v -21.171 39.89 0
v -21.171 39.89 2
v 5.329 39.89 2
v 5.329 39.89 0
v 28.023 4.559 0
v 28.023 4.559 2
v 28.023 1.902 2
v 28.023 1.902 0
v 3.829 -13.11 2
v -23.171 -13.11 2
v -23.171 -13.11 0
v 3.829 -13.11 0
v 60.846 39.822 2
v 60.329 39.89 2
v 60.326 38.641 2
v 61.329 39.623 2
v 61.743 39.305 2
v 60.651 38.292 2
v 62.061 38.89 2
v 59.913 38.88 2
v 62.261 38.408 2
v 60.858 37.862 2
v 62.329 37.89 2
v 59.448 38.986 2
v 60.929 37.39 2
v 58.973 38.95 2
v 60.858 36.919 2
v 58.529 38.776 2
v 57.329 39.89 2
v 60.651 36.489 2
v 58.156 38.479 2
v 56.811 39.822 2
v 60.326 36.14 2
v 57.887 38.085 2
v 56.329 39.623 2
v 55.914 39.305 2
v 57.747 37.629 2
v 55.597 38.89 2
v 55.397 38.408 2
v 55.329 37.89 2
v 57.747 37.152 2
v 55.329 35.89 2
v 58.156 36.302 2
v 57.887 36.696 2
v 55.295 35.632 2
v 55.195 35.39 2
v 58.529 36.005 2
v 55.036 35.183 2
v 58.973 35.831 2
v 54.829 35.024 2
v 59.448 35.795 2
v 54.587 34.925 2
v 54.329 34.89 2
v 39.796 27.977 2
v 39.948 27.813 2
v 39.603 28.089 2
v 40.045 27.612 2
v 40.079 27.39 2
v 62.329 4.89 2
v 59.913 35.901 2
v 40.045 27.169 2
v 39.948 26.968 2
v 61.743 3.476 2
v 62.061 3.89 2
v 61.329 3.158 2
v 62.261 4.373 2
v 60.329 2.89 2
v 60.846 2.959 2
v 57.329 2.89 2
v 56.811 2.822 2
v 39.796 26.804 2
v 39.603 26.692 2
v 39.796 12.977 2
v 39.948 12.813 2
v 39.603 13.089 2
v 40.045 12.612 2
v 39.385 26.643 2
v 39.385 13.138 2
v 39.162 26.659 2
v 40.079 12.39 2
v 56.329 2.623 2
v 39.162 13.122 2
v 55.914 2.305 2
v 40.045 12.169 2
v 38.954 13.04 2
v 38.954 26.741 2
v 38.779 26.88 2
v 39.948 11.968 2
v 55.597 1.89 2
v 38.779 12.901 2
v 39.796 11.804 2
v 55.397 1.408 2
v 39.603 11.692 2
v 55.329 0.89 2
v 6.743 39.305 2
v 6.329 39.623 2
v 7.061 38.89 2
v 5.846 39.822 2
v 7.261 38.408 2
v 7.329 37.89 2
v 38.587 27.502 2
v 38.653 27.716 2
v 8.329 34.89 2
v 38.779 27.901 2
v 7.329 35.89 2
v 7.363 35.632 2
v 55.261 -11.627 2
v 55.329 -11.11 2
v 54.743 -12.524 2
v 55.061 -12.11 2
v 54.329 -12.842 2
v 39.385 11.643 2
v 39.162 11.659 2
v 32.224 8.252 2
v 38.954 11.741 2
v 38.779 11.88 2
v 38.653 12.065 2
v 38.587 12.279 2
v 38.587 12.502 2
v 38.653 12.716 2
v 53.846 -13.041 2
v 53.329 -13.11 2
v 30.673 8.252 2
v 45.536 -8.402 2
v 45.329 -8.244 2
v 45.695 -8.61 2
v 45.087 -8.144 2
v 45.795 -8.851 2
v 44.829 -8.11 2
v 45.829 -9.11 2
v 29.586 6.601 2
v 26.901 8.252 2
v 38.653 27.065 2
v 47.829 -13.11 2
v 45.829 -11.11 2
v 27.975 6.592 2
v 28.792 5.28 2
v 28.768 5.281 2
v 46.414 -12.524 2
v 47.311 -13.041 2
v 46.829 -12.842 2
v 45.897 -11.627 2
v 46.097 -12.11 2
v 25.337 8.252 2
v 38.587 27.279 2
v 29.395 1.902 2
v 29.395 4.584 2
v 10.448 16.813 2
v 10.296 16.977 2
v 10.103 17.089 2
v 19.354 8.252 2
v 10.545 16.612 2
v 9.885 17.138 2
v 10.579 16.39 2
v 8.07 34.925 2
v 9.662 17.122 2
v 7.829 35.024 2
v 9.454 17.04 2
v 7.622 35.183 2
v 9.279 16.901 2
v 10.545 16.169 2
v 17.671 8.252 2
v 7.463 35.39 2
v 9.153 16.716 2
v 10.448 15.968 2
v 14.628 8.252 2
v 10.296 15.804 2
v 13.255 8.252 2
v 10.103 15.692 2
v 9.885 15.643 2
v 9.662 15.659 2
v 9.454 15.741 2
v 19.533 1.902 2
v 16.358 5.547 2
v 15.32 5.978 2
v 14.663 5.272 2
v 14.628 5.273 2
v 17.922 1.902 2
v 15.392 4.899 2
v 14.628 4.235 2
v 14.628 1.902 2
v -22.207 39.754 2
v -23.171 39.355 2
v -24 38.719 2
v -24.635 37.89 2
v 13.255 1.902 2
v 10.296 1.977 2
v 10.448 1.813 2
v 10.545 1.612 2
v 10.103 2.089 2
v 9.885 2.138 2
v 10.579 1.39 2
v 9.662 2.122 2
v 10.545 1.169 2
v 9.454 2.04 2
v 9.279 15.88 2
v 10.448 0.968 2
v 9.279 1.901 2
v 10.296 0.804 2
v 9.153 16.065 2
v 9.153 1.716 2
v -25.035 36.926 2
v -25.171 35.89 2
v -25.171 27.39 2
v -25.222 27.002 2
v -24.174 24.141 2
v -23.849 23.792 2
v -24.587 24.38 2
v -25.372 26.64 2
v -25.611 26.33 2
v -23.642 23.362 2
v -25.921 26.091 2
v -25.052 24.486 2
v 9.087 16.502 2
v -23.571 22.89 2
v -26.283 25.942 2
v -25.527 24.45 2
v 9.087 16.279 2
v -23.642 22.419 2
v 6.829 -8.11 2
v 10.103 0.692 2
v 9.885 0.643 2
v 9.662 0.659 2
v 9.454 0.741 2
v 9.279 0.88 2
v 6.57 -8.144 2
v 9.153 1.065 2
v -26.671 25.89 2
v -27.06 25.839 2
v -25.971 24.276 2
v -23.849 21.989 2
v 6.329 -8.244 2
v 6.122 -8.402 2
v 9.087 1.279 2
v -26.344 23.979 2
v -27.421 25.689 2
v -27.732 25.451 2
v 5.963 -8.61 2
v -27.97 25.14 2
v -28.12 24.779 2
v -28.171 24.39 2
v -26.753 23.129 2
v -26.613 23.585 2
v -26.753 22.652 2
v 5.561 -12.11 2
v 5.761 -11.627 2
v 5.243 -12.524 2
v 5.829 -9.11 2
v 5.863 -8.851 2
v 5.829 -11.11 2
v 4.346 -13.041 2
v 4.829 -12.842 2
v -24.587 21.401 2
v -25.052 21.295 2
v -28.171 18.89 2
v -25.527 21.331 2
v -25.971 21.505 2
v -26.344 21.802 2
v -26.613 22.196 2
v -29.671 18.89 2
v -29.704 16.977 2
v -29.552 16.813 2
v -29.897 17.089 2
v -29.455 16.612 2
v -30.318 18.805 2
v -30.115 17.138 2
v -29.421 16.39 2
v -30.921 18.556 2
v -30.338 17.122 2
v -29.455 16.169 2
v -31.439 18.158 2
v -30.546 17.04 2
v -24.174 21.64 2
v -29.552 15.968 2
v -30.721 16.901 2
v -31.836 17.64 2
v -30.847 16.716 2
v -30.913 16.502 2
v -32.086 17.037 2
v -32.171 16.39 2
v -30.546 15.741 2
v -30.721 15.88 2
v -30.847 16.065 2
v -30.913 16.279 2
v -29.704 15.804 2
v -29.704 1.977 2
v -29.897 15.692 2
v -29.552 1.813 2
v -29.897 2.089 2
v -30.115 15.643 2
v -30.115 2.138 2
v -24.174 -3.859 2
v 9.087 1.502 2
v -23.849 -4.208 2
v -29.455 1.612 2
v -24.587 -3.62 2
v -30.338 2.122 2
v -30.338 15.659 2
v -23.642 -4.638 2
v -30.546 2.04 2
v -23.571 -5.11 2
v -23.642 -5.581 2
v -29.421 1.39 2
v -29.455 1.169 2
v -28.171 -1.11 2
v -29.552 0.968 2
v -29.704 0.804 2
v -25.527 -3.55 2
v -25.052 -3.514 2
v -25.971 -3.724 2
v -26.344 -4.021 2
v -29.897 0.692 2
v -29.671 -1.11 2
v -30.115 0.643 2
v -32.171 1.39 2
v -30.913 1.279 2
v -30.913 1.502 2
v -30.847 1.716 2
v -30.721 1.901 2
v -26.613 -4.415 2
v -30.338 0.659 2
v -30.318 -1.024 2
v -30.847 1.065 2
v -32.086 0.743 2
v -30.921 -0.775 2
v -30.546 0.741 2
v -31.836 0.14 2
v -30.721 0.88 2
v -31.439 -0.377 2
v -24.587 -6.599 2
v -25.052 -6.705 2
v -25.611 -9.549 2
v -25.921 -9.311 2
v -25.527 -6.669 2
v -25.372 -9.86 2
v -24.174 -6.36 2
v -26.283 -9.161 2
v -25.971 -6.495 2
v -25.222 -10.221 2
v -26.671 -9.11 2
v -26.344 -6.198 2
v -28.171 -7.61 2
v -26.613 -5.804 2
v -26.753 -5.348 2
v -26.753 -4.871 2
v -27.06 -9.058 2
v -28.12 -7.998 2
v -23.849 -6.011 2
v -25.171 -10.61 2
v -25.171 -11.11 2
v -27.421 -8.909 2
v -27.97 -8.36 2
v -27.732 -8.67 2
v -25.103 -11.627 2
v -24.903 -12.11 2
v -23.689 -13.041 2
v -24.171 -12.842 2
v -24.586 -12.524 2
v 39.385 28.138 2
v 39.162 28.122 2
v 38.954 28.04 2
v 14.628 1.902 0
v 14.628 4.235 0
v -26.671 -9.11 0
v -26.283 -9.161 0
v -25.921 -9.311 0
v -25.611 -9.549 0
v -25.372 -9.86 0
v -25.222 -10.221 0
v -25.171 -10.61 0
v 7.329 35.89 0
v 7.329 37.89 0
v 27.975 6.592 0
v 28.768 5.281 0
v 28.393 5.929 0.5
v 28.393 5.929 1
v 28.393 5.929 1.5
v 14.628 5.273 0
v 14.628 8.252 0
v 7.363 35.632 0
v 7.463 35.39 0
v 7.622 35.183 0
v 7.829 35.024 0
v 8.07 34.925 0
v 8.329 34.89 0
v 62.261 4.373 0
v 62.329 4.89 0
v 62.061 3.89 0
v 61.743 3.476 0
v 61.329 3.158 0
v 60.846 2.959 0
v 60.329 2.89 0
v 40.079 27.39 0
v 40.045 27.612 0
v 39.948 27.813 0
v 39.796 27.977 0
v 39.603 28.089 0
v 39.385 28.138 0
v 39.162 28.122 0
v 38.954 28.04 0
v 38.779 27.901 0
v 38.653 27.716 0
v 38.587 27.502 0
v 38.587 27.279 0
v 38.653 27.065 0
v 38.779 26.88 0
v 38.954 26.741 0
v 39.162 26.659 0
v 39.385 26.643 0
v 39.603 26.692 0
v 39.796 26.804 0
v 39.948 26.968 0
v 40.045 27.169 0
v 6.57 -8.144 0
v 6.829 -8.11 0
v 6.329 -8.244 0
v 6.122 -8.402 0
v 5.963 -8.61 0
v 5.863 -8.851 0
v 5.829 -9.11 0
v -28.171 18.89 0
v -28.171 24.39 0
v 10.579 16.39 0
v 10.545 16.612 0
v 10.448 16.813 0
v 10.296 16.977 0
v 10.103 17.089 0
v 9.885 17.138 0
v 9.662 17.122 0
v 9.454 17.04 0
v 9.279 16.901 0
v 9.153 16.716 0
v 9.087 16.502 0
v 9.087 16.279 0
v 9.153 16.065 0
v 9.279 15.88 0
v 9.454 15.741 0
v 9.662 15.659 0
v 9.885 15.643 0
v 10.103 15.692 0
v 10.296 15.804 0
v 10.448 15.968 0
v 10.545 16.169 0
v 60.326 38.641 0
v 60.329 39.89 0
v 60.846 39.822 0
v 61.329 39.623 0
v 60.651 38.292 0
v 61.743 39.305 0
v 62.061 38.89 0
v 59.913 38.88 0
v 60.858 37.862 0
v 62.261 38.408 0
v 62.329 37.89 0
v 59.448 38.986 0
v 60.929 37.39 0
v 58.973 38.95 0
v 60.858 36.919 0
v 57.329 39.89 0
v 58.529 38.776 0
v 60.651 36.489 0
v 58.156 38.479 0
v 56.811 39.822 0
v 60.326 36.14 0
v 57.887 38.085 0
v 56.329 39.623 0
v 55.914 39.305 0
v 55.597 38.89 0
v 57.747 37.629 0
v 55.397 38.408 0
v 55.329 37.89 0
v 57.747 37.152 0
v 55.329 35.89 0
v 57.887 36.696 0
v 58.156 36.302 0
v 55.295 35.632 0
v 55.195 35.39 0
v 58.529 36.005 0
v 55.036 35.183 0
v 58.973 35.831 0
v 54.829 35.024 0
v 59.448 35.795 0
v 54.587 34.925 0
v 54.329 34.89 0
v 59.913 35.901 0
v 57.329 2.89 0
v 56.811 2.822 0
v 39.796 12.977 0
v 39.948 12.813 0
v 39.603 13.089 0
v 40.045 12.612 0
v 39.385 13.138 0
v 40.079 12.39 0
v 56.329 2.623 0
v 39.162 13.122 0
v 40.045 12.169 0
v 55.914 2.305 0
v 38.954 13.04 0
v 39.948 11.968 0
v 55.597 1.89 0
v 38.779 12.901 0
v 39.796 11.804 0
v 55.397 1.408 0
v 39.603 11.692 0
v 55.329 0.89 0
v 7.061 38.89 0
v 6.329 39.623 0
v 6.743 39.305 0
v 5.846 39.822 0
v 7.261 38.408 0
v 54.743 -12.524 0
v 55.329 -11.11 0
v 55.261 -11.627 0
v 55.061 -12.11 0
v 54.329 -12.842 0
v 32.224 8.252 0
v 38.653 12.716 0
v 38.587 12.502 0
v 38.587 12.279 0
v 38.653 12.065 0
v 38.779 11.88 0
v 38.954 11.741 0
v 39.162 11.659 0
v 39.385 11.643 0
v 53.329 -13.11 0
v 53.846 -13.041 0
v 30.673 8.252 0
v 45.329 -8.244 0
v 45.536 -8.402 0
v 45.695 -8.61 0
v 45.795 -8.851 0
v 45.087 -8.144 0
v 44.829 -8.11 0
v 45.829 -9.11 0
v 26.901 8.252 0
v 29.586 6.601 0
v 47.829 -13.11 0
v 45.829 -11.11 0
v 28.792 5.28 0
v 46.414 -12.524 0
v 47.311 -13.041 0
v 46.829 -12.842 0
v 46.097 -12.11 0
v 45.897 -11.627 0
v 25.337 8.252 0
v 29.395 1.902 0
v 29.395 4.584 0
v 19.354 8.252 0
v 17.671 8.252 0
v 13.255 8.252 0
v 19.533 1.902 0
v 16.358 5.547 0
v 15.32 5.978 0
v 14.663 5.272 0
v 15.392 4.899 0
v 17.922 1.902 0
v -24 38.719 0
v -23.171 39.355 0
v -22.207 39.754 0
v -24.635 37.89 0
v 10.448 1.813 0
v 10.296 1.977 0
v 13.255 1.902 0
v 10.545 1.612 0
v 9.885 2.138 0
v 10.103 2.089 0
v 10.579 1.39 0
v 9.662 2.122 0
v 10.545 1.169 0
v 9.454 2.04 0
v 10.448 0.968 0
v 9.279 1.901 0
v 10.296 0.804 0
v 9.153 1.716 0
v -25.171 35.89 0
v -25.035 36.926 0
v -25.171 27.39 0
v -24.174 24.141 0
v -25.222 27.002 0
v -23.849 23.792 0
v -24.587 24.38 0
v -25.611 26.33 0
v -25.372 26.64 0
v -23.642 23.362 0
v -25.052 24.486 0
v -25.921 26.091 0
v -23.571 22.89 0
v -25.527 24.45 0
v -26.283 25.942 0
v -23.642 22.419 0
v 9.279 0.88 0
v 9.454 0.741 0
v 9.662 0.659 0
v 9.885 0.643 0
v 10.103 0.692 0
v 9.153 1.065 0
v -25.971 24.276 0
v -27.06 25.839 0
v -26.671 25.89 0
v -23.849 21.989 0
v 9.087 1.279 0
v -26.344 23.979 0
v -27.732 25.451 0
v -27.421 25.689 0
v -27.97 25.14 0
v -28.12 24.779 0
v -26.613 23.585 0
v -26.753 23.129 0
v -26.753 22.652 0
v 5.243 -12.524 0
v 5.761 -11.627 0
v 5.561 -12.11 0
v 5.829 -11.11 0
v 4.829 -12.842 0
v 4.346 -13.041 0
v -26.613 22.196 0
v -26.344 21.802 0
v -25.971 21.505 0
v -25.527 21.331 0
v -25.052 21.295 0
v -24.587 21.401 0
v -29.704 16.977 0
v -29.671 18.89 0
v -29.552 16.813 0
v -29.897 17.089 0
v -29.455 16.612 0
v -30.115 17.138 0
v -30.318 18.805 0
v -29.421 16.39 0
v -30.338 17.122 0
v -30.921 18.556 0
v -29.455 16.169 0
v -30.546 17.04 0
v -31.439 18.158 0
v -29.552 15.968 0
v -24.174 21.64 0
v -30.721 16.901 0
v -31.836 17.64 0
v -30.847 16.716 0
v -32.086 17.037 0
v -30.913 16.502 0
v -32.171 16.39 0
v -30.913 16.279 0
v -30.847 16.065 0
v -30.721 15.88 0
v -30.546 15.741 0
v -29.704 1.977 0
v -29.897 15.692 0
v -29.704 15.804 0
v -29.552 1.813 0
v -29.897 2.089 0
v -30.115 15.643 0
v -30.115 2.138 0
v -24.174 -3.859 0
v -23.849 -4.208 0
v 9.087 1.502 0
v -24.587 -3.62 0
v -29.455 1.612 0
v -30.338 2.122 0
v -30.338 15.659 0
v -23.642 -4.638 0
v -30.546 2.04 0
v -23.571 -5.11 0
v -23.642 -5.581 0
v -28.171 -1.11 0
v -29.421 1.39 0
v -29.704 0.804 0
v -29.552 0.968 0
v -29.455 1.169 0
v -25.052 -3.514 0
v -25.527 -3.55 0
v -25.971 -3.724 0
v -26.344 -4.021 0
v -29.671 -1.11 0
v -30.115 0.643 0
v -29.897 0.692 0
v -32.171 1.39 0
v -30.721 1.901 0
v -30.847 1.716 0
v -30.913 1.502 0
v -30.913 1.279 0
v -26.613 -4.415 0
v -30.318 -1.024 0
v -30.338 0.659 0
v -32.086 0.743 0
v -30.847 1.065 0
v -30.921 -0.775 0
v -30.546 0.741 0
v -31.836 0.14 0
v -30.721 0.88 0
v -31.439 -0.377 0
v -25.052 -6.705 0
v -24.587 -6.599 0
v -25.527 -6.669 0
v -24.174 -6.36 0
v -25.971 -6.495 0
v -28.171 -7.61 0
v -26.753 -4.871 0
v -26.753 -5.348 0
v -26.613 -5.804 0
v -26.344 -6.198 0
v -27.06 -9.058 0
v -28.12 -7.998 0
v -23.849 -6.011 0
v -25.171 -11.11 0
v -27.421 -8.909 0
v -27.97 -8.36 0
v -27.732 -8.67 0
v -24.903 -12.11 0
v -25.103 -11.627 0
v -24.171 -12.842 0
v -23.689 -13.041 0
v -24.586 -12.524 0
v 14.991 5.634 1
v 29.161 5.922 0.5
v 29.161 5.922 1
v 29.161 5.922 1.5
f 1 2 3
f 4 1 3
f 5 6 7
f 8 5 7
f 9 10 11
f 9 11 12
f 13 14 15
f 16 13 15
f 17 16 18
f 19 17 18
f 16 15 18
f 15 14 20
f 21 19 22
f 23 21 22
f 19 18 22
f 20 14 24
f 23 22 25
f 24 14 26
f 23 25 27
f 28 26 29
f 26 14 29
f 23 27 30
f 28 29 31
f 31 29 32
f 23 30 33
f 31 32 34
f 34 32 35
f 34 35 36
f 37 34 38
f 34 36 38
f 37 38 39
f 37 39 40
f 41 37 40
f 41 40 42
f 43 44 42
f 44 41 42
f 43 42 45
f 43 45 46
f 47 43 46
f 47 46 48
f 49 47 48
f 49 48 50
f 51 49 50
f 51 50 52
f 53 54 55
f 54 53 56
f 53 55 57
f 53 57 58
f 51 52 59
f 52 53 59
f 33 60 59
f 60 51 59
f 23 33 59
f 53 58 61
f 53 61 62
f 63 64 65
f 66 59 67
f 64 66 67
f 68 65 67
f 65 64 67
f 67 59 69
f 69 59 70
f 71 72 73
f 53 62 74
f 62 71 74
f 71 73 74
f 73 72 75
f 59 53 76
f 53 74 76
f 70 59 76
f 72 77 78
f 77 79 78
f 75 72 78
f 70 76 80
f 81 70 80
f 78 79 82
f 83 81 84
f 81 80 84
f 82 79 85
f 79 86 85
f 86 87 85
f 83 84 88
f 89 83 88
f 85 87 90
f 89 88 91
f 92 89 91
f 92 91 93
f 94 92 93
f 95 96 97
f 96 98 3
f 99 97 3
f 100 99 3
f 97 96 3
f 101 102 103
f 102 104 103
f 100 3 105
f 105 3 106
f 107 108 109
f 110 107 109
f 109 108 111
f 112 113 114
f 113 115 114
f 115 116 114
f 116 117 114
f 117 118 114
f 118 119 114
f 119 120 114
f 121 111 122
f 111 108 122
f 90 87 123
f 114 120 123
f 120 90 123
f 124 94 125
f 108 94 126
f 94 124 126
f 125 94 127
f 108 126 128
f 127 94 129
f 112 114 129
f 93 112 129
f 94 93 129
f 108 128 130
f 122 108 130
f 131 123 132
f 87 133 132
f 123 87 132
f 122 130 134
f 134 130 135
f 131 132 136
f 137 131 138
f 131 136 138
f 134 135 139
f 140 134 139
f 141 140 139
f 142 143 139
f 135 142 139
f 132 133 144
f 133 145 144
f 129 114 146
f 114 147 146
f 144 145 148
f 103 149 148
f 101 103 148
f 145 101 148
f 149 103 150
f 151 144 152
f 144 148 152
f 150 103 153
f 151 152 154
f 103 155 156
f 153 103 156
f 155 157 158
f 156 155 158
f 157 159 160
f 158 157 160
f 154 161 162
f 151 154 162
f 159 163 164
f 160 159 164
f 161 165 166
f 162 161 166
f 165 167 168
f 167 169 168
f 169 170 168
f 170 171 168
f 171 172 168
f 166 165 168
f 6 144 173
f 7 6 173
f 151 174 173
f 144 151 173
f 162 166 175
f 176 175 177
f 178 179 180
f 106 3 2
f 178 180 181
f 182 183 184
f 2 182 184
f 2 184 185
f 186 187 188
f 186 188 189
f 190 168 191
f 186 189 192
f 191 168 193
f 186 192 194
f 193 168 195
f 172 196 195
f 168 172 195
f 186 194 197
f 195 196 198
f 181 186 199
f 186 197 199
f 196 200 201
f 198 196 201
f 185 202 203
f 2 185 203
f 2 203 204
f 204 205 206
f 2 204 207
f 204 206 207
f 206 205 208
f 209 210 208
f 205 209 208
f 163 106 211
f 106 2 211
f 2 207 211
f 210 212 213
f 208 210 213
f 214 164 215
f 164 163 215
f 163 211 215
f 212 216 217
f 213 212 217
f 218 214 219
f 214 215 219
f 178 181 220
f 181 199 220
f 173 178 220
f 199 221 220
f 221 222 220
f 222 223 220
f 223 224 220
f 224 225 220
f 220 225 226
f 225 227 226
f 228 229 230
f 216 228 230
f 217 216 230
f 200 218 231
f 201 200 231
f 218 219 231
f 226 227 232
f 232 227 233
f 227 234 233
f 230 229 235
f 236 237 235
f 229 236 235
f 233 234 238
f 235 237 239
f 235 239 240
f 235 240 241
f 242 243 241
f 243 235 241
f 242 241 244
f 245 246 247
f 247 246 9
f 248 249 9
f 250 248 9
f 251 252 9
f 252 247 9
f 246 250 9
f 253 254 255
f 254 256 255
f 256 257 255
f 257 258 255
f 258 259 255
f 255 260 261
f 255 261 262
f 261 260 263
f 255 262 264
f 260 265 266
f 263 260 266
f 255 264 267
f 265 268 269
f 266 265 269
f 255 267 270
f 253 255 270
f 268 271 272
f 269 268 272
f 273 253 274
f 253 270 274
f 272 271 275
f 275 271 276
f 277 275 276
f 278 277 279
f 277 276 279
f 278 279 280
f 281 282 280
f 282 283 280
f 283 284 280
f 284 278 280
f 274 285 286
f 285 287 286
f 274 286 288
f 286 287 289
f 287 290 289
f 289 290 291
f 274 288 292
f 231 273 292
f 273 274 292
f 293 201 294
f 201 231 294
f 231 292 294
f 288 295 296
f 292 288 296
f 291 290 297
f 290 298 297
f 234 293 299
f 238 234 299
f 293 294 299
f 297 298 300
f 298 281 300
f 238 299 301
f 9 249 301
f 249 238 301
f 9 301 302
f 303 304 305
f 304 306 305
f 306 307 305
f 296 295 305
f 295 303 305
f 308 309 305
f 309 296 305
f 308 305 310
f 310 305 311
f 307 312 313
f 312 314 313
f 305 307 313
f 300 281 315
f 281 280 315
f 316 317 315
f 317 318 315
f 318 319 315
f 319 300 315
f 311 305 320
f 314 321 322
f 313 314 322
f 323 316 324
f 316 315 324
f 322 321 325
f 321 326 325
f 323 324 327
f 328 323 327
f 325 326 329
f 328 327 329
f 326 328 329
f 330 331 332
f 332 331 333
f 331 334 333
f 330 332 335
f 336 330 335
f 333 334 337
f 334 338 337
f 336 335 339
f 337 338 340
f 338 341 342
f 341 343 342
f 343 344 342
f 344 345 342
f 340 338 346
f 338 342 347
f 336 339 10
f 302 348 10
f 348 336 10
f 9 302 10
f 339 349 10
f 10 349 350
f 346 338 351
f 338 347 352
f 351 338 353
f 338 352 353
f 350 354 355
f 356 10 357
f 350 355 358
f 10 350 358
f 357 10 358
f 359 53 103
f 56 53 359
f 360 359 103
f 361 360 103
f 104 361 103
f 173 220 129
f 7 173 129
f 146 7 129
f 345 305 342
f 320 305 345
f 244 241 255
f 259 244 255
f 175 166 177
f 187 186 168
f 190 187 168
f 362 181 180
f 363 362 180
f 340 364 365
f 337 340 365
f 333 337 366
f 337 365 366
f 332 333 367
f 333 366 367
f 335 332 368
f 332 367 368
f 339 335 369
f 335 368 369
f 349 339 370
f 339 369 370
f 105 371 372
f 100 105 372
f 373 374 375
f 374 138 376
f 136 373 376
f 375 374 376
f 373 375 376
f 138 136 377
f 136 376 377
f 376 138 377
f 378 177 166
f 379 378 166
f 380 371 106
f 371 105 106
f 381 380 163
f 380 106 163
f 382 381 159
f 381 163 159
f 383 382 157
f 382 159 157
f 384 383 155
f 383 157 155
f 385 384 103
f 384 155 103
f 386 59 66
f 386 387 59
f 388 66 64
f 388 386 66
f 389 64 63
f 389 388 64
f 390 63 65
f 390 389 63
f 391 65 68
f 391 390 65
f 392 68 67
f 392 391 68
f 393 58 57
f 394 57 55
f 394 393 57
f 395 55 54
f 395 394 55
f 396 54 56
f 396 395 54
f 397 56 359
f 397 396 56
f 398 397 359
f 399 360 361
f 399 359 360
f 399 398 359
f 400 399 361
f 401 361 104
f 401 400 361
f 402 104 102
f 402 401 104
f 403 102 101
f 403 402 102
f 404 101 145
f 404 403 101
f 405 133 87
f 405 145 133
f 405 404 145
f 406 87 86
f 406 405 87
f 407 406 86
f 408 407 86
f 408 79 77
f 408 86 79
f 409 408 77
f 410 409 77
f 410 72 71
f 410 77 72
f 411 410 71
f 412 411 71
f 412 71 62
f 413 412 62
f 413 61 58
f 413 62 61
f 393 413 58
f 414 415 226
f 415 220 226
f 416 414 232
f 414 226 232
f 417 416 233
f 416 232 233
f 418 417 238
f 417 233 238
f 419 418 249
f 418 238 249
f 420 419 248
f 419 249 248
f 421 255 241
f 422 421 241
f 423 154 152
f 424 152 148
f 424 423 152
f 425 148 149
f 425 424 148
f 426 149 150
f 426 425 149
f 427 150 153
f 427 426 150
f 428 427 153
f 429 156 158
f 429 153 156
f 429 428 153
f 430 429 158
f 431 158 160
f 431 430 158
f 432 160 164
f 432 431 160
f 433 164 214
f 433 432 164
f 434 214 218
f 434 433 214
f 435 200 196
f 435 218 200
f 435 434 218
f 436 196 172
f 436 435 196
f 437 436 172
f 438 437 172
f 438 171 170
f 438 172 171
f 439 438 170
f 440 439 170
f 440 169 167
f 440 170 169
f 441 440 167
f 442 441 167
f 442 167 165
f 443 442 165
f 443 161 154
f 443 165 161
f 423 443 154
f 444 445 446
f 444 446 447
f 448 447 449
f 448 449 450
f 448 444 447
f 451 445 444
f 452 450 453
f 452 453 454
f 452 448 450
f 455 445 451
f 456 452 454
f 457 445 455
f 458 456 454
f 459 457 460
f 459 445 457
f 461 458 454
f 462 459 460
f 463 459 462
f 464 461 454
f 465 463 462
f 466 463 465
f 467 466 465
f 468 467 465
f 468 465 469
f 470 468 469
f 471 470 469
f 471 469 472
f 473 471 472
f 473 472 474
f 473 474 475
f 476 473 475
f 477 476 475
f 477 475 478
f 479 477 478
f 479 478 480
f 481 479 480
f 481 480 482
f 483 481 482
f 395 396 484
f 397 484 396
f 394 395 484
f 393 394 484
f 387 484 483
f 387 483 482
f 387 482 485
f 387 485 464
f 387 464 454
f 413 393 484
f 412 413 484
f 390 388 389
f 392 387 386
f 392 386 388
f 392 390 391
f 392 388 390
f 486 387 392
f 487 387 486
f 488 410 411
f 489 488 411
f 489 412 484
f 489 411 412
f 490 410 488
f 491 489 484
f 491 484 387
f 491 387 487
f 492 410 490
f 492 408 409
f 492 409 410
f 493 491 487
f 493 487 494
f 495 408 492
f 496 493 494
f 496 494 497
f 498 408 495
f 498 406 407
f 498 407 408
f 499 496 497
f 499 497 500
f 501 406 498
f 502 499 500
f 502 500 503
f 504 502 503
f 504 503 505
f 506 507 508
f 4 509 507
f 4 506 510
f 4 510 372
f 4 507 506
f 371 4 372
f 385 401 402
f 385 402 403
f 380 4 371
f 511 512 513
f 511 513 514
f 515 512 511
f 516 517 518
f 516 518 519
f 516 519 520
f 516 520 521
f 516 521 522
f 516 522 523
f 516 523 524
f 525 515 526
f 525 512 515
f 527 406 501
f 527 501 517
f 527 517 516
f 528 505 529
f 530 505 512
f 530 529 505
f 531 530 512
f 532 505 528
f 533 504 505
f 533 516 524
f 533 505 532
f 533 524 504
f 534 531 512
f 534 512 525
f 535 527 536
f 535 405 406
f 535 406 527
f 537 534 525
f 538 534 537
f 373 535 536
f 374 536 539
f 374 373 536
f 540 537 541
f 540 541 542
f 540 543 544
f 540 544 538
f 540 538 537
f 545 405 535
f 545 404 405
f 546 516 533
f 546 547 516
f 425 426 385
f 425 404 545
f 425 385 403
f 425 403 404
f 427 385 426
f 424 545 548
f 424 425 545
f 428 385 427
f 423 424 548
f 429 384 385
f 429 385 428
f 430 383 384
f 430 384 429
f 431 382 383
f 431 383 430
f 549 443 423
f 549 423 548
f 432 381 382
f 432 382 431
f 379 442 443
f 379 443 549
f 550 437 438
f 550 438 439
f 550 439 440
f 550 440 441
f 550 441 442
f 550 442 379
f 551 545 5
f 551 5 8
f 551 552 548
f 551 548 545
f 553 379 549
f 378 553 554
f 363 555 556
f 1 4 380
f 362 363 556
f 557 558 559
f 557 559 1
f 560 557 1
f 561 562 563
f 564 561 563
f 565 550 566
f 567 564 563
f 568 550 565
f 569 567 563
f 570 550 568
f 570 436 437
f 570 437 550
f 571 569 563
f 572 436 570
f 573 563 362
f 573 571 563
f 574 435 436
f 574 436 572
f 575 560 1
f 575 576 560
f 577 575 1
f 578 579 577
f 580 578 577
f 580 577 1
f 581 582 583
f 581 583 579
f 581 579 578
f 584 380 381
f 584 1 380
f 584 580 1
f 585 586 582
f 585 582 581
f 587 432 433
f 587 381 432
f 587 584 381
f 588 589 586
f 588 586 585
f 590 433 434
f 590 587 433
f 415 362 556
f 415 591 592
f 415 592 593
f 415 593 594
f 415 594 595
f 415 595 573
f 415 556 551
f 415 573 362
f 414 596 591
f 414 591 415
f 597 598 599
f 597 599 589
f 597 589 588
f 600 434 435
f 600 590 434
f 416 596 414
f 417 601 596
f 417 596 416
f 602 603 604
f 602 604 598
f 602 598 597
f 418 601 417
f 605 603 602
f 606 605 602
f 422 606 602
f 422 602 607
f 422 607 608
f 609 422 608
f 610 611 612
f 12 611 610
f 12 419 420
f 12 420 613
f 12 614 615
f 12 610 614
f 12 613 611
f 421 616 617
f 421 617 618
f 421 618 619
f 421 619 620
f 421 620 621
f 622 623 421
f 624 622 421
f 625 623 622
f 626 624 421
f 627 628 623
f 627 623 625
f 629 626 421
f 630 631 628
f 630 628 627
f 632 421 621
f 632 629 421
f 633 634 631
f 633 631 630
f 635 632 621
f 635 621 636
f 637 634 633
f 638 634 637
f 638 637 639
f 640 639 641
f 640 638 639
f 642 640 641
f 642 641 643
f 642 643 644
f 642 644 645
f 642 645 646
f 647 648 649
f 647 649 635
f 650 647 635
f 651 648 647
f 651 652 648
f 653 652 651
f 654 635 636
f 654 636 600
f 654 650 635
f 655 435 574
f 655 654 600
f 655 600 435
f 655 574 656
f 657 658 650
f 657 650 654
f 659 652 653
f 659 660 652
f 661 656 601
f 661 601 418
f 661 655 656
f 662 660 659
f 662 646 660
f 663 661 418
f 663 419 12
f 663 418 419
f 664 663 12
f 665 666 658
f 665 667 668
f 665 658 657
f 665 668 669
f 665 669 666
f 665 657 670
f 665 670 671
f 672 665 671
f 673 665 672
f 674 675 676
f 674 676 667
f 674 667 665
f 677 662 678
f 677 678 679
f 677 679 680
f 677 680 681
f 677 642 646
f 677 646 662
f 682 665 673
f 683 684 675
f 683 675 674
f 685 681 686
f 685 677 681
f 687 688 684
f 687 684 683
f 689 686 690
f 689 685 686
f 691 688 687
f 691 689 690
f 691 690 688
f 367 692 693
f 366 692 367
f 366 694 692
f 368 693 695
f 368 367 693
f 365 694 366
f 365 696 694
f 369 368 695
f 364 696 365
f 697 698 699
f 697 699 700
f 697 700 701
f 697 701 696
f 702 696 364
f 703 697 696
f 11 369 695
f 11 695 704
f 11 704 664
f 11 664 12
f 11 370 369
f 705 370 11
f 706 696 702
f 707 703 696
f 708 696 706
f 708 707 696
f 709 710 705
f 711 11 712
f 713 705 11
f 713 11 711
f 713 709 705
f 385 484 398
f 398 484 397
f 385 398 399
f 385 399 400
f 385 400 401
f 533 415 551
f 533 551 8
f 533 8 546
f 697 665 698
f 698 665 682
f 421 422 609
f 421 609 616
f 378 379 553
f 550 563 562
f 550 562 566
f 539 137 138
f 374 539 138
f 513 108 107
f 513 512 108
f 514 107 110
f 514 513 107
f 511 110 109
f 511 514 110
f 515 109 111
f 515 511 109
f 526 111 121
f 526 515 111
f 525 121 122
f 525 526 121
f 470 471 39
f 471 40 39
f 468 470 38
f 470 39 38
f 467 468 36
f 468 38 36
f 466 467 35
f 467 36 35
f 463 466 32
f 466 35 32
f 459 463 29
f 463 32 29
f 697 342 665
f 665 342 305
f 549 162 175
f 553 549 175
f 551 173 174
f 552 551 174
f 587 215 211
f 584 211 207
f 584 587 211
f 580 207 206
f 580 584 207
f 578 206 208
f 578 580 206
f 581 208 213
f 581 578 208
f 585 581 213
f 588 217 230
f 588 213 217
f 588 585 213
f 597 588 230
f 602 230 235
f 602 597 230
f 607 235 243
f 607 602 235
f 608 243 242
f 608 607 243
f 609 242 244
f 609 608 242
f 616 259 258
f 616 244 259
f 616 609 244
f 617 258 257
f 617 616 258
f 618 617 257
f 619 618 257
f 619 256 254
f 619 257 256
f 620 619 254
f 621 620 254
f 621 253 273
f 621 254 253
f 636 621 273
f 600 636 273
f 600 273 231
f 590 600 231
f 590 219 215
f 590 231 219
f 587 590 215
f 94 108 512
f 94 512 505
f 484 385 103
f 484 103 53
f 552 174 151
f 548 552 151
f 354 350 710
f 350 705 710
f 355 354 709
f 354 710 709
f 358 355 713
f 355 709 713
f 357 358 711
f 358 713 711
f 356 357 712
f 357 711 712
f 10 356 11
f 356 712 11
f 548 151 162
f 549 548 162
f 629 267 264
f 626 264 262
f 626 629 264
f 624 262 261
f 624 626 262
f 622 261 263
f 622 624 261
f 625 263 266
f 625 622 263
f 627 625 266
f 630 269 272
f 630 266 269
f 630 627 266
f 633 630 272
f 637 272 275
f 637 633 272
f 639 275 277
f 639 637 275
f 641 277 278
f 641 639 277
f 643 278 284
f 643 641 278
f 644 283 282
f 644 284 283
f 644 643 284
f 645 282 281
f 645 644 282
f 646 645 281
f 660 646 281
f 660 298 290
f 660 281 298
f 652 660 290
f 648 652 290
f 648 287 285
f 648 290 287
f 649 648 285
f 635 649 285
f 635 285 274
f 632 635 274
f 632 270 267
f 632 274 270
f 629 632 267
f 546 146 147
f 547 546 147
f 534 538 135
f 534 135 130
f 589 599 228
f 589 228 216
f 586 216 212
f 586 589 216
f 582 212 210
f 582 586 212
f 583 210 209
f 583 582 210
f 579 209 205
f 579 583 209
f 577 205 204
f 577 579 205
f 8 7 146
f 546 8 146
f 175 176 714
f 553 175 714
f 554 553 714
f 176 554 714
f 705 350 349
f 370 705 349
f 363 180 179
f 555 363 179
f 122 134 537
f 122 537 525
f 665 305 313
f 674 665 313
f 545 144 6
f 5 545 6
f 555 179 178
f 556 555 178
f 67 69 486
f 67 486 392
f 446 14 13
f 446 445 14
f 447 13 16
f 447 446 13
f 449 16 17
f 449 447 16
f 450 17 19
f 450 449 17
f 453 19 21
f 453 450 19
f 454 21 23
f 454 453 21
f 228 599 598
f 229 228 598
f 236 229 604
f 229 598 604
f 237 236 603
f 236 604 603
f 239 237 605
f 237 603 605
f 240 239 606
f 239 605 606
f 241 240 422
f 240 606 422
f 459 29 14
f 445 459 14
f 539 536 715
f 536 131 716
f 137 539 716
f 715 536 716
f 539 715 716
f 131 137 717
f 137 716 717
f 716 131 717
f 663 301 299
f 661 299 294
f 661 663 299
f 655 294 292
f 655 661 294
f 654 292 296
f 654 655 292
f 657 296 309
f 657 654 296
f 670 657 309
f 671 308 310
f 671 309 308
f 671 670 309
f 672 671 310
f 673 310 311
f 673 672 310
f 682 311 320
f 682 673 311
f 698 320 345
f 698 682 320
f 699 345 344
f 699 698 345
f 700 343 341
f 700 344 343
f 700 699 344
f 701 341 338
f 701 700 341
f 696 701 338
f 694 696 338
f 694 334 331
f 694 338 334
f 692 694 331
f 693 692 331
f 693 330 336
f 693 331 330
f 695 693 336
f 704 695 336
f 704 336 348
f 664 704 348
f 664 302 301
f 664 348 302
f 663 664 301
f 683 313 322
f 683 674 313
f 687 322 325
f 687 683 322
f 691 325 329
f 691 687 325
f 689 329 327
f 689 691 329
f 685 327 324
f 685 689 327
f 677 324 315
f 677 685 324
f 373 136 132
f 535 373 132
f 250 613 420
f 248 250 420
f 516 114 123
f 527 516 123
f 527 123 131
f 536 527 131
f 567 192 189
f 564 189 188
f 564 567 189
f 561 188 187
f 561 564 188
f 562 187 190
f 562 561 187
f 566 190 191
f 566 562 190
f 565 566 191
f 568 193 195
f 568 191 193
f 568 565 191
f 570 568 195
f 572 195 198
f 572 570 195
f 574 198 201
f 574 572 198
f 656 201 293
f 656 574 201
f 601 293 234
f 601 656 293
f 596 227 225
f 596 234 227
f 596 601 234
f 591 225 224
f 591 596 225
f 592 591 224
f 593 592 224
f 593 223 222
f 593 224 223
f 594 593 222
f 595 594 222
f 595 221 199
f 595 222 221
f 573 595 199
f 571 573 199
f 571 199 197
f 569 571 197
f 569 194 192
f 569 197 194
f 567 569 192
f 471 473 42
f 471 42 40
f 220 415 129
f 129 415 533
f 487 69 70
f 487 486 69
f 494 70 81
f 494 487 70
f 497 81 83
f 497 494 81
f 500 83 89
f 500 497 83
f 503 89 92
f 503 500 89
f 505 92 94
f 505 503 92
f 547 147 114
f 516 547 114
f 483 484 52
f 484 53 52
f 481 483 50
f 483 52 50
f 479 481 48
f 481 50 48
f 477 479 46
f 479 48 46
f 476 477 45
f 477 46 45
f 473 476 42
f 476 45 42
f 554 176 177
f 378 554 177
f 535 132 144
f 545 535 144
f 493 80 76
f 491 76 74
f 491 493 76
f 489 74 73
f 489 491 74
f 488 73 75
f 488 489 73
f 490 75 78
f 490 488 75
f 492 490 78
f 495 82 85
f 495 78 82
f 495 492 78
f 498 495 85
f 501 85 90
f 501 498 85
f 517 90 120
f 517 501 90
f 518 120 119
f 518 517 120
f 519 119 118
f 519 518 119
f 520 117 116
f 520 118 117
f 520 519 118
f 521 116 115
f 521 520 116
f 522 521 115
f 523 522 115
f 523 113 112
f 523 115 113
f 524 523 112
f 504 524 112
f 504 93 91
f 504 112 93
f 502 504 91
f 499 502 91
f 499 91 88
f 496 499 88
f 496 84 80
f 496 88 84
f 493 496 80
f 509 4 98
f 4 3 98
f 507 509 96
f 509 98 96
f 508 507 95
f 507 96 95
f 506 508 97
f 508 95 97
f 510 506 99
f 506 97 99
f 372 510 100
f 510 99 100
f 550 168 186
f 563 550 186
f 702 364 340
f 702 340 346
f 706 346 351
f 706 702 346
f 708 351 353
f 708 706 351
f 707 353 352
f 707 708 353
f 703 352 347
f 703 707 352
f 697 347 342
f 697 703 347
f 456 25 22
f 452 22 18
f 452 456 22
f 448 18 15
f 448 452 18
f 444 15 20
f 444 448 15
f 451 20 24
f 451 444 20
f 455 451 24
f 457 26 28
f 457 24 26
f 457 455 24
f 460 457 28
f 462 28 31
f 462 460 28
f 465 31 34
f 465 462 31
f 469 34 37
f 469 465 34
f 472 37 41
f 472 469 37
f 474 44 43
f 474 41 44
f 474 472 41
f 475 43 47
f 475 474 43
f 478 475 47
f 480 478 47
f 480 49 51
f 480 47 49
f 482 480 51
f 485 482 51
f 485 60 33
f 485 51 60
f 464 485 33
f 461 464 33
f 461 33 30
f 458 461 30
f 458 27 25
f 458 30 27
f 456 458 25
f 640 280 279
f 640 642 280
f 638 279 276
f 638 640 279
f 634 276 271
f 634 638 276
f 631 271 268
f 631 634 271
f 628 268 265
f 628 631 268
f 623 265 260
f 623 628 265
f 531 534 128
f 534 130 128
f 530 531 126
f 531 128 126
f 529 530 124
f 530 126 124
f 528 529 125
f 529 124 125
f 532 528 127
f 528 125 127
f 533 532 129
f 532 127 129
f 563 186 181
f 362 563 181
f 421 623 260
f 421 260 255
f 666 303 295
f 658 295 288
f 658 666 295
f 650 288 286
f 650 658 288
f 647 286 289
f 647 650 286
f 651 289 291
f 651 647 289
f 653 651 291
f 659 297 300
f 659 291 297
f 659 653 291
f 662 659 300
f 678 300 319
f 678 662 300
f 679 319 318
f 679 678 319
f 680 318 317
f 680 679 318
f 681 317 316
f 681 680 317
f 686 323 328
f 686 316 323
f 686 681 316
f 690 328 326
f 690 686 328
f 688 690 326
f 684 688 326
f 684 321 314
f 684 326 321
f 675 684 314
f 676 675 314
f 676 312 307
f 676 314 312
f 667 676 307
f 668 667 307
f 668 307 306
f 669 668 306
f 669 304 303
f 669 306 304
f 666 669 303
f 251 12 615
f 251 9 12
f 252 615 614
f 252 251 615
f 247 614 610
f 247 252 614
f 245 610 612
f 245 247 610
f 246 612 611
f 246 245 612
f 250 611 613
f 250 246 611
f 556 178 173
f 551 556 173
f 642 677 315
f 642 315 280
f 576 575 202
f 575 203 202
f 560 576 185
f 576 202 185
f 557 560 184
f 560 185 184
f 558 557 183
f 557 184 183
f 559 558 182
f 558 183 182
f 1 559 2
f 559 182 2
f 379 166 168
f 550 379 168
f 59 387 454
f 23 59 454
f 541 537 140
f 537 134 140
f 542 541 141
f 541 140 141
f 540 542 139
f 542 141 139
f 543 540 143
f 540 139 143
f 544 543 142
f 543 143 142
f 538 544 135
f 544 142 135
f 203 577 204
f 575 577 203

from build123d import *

# Parameters (mm, degrees)
SKETCH_6_W          = 94.5
SKETCH_6_H          = 55
EXTRUDE_1_DEPTH     = 2
SKETCH_772_W        = 40
SKETCH_772_H        = 6
SKETCH_772_W_2      = 48
CUT_EXTRUDE_1_DEPTH = 75.571373034
JOY_R               = 1.6
CUT_EXTRUDE_2_DEPTH = 75.571373034
NANO_R              = 0.75
CUT_EXTRUDE_4_DEPTH = 75.571373034
SKETCH_648_R        = 0.75
CUT_EXTRUDE_5_DEPTH = 75.571373034
SKETCH_7_W          = 7
SKETCH_7_H          = 17
SKETCH_7_W_2        = 4
SKETCH_7_H_2        = 22
CUT_EXTRUDE_6_DEPTH = 75.571373034
CUT_EXTRUDE_7_DEPTH = 75.571373034
SKETCH_10_W         = 90.5
SKETCH_10_H         = 1
SKETCH_10_W_2       = 80.5
CUT_EXTRUDE_8_DEPTH = 75.571373175
FILLET_3_R          = 1
FILLET_START        = -1
FILLET_4_DEPTH      = 4
FILLET_4_2_DEPTH    = 2
FILLET_5_R          = 2
FILLET_6_R          = 2.5
SKETCH_11_W         = 3
SKETCH_11_H         = 14
CUT_EXTRUDE_9_DEPTH = 75.027756944
FILLET_7_R          = 1.5
FILLET_8_R          = 4


with BuildPart() as part:
    # 草图6 → 凸台-拉伸1 (new body)
    with BuildSketch(Plane.XY):
        with Locations((15.078651685, 13.390449438)):
            Rectangle(SKETCH_6_W, SKETCH_6_H)
    extrude(amount=EXTRUDE_1_DEPTH)

    # Sketch 772 → 切除-拉伸1 (cut, through all)
    with BuildSketch(Plane.XY):
        with Locations((25.828651685, -11.109550562)):
            Rectangle(SKETCH_772_W, SKETCH_772_H)
        with Locations((31.328651685, 37.890449438)):
            Rectangle(SKETCH_772_W_2, SKETCH_772_H)
    extrude(amount=CUT_EXTRUDE_1_DEPTH, mode=Mode.SUBTRACT)

    # Joy → 切除-拉伸2 (cut, through all)
    with BuildSketch(Plane.XY):
        with Locations((-25.171348315, 22.890449438)):
            Circle(JOY_R)
        with Locations((59.328651685, 37.390449438)):
            Circle(JOY_R)
        with Locations((-25.171348315, -5.109550562)):
            Circle(JOY_R)
    extrude(amount=CUT_EXTRUDE_2_DEPTH, mode=Mode.SUBTRACT)

    # Nano → 切除-拉伸4 (cut, through all)
    with BuildSketch(Plane.XY):
        with Locations((-30.171348315, 16.390449438)):
            Circle(NANO_R)
        with Locations((9.828651685, 1.390449438)):
            Circle(NANO_R)
        with Locations((-30.171348315, 1.390449438)):
            Circle(NANO_R)
        with Locations((9.828651685, 16.390449438)):
            Circle(NANO_R)
    extrude(amount=CUT_EXTRUDE_4_DEPTH, mode=Mode.SUBTRACT)

    # Sketch 648 → 切除-拉伸5 (cut, through all)
    with BuildSketch(Plane.XY):
        with Locations((39.328651685, 12.390449438)):
            Circle(SKETCH_648_R)
        with Locations((39.328651685, 27.390449438)):
            Circle(SKETCH_648_R)
    extrude(amount=CUT_EXTRUDE_5_DEPTH, mode=Mode.SUBTRACT)

    # 草图7 → 切除-拉伸6 (cut, through all)
    with BuildSketch(Plane.XY.offset(2)):
        with Locations((58.828651685, -5.609550562)):
            Rectangle(SKETCH_7_W, SKETCH_7_H)
        Polygon((-32.171348315, -14.109550562), (-25.171348315, -14.109550562), (-25.171348315, -9.109550562), (-28.171348315, -9.109550562), (-28.171348315, -1.109550562), (-32.171348315, -1.109550562), (-32.171348315, -10.609550562), align=None)
        with Locations((-30.171348315, 29.890449438)):
            Rectangle(SKETCH_7_W_2, SKETCH_7_H_2)
    extrude(amount=-CUT_EXTRUDE_6_DEPTH, mode=Mode.SUBTRACT)

    # 草图9 → 切除-拉伸7 (cut, through all)
    with BuildSketch(Plane.XY.offset(2)):
        with BuildLine():
            Line((16.358384135, 5.546605741), (19.354312374, 8.252448685))
            Line((19.354312374, 8.252448685), (17.671340733, 8.252448685))
            Line((17.671340733, 8.252448685), (15.319954825, 5.97825988))
            add(Edge.make_bspline(
                [(15.319954825, 5.97825988), (15.209662045, 5.864263234), (14.985948929, 5.633037354), (14.771319897, 5.3933541), (14.662505102, 5.271837061)],
                knots=[0, 0, 0, 0, 0.986019789, 2, 2, 2, 2], degree=3))
            Line((14.662505102, 5.271837061), (14.627668618, 5.272671384))
            Line((14.627668618, 5.272671384), (14.627668618, 8.252448685))
            Line((14.627668618, 8.252448685), (13.255032174, 8.252448685))
            Line((13.255032174, 8.252448685), (13.255032174, 1.902448685))
            Line((13.255032174, 1.902448685), (14.627668618, 1.902448685))
            Line((14.627668618, 1.902448685), (14.627668618, 4.235041243))
            Line((14.627668618, 4.235041243), (15.391570639, 4.899124533))
            Line((15.391570639, 4.899124533), (17.921996084, 1.902448685))
            Line((17.921996084, 1.902448685), (19.53335191, 1.902448685))
            Line((19.53335191, 1.902448685), (16.358384135, 5.546605741))
        make_face()
        with BuildLine():
            Line((30.672569626, 8.252448685), (29.58639644, 6.600837965))
            add(Edge.make_bspline(
                [(29.58639644, 6.600837965), (29.512770867, 6.486048967), (29.368664533, 6.261374021), (29.16262961, 5.926527835), (28.970896691, 5.601336831), (28.850642197, 5.385664551), (28.791857671, 5.280236534)],
                knots=[0, 0, 0, 0, 1.061571746, 2.077799947, 3.060362604, 4, 4, 4, 4], degree=3))
            Line((28.791857671, 5.280236534), (28.76821775, 5.280972425))
            add(Edge.make_bspline(
                [(28.76821775, 5.280972425), (28.708109277, 5.390783537), (28.58821426, 5.609817636), (28.392410779, 5.93256056), (28.188467145, 6.25994594), (28.046996459, 6.479545222), (27.974708994, 6.591754161)],
                knots=[0, 0, 0, 0, 0.980022492, 1.954796193, 2.954959484, 4, 4, 4, 4], degree=3))
            Line((27.974708994, 6.591754161), (26.900724886, 8.252448685))
            Line((26.900724886, 8.252448685), (25.337112937, 8.252448685))
            Line((25.337112937, 8.252448685), (28.02270598, 4.558781847))
            Line((28.02270598, 4.558781847), (28.02270598, 1.902448685))
            Line((28.02270598, 1.902448685), (29.395420935, 1.902448685))
            Line((29.395420935, 1.902448685), (29.395420935, 4.58368497))
            Line((29.395420935, 4.58368497), (32.224245607, 8.252448685))
            Line((32.224245607, 8.252448685), (30.672569626, 8.252448685))
        make_face()
    extrude(amount=-CUT_EXTRUDE_7_DEPTH, mode=Mode.SUBTRACT)

    # 草图10 → 切除-拉伸8 (cut, through all)
    with BuildSketch(Plane.XY.offset(2)):
        with Locations((17.078651685, 40.390449438)):
            Rectangle(SKETCH_10_W, SKETCH_10_H)
        with Locations((15.078651685, -13.609550562)):
            Rectangle(SKETCH_10_W_2, SKETCH_10_H)
    extrude(amount=-CUT_EXTRUDE_8_DEPTH, mode=Mode.SUBTRACT)

    # 圆角3
    fillet_3_edges = [part.edges().sort_by_distance(p)[0] for p in [
        (45.828651685, -8.109550562, 1),
        (5.828651685, -8.109550562, 1),
        (55.328651685, 34.890449438, 1),
        (7.328651685, 34.890449438, 1),
    ]]
    fillet(fillet_3_edges, radius=FILLET_3_R)

    # 圆角4: read off the stored shape, not the designer's step
    # 圆角4 outline → 圆角4 (cut)
    with BuildSketch(Plane.XY.offset(FILLET_START)):
        with BuildLine():
            ThreePointArc((-26.671348315, -9.109550562), (-27.732008486, -8.670210734), (-28.171348315, -7.609550562))
            Line((-28.171348315, -7.609550562), (-28.171348315, -9.109550562))
            Line((-28.171348315, -9.109550562), (-26.671348315, -9.109550562))
        make_face()
    extrude(amount=FILLET_4_DEPTH, mode=Mode.SUBTRACT)

    # Fillet 4 2 outline → Fillet 4 2 (add)
    with BuildSketch(Plane.XY):
        with BuildLine():
            Line((-25.171348315, -9.109550562), (-26.671348315, -9.109550562))
            ThreePointArc((-26.671348315, -9.109550562), (-25.610688143, -9.54889039), (-25.171348315, -10.609550562))
            Line((-25.171348315, -10.609550562), (-25.171348315, -9.109550562))
        make_face()
    extrude(amount=FILLET_4_2_DEPTH)

    # 圆角5
    fillet_5_edges = [part.edges().sort_by_distance(p)[0] for p in [
        (55.328651685, 2.890449438, 1),
        (55.328651685, 39.890449438, 1),
        (7.328651685, 39.890449438, 1),
        (62.328651685, 39.890449438, 1),
        (45.828651685, -13.109550562, 1),
        (5.828651685, -13.109550562, 1),
        (-25.171348315, -13.109550562, 1),
        (55.328651685, -13.109550562, 1),
        (62.328651685, 2.890449438, 1),
    ]]
    fillet(fillet_5_edges, radius=FILLET_5_R)

    # 圆角6
    fillet_6_edges = [part.edges().sort_by_distance(p)[0] for p in [
        (-32.171348315, -1.109550562, 1),
        (-32.171348315, 18.890449438, 1),
    ]]
    fillet(fillet_6_edges, radius=FILLET_6_R)

    # 草图11 → 切除-拉伸9 (cut, through all)
    with BuildSketch(Plane(origin=(0, 0, 0), x_dir=(-1, 0, 0), z_dir=(0, 0, -1))):
        with Locations((26.671348315, 32.890449438)):
            Rectangle(SKETCH_11_W, SKETCH_11_H)
    extrude(amount=-CUT_EXTRUDE_9_DEPTH, mode=Mode.SUBTRACT)

    # 圆角7
    # the kernel refuses this fillet: 1.5 mm, written as the material it adds along each edge
    with BuildSketch(Plane(origin=(-25.171348315, 25.890449438, 0), x_dir=(0, 1, 0), z_dir=(0, 0, 1))) as fillet_7_piece_1:
        with BuildLine():
            CenterArc((FILLET_7_R, FILLET_7_R), FILLET_7_R, 180, 90)
            Line((0, FILLET_7_R), (0, 0))
            Line((0, 0), (FILLET_7_R, 0))
        make_face()
    extrude(amount=2)
    # the kernel refuses this fillet: 1.5 mm, written as the material it takes off along each edge
    with BuildSketch(Plane(origin=(-28.171348315, 25.890449438, -3.75), x_dir=(1, 0, 0), z_dir=(0, 0, 1))) as fillet_7_2_piece_1:
        with BuildLine():
            CenterArc((FILLET_7_R, -FILLET_7_R), FILLET_7_R, 90, 90)
            Line((0, -FILLET_7_R), (0, 0))
            Line((0, 0), (FILLET_7_R, 0))
        make_face()
    extrude(amount=9.5, mode=Mode.SUBTRACT)

    # 圆角8
    fillet_8_edges = [part.edges().sort_by_distance(p)[0] for p in [
        (-25.171348315, 39.890449438, 1),
    ]]
    fillet(fillet_8_edges, radius=FILLET_8_R)


solid = part.part
